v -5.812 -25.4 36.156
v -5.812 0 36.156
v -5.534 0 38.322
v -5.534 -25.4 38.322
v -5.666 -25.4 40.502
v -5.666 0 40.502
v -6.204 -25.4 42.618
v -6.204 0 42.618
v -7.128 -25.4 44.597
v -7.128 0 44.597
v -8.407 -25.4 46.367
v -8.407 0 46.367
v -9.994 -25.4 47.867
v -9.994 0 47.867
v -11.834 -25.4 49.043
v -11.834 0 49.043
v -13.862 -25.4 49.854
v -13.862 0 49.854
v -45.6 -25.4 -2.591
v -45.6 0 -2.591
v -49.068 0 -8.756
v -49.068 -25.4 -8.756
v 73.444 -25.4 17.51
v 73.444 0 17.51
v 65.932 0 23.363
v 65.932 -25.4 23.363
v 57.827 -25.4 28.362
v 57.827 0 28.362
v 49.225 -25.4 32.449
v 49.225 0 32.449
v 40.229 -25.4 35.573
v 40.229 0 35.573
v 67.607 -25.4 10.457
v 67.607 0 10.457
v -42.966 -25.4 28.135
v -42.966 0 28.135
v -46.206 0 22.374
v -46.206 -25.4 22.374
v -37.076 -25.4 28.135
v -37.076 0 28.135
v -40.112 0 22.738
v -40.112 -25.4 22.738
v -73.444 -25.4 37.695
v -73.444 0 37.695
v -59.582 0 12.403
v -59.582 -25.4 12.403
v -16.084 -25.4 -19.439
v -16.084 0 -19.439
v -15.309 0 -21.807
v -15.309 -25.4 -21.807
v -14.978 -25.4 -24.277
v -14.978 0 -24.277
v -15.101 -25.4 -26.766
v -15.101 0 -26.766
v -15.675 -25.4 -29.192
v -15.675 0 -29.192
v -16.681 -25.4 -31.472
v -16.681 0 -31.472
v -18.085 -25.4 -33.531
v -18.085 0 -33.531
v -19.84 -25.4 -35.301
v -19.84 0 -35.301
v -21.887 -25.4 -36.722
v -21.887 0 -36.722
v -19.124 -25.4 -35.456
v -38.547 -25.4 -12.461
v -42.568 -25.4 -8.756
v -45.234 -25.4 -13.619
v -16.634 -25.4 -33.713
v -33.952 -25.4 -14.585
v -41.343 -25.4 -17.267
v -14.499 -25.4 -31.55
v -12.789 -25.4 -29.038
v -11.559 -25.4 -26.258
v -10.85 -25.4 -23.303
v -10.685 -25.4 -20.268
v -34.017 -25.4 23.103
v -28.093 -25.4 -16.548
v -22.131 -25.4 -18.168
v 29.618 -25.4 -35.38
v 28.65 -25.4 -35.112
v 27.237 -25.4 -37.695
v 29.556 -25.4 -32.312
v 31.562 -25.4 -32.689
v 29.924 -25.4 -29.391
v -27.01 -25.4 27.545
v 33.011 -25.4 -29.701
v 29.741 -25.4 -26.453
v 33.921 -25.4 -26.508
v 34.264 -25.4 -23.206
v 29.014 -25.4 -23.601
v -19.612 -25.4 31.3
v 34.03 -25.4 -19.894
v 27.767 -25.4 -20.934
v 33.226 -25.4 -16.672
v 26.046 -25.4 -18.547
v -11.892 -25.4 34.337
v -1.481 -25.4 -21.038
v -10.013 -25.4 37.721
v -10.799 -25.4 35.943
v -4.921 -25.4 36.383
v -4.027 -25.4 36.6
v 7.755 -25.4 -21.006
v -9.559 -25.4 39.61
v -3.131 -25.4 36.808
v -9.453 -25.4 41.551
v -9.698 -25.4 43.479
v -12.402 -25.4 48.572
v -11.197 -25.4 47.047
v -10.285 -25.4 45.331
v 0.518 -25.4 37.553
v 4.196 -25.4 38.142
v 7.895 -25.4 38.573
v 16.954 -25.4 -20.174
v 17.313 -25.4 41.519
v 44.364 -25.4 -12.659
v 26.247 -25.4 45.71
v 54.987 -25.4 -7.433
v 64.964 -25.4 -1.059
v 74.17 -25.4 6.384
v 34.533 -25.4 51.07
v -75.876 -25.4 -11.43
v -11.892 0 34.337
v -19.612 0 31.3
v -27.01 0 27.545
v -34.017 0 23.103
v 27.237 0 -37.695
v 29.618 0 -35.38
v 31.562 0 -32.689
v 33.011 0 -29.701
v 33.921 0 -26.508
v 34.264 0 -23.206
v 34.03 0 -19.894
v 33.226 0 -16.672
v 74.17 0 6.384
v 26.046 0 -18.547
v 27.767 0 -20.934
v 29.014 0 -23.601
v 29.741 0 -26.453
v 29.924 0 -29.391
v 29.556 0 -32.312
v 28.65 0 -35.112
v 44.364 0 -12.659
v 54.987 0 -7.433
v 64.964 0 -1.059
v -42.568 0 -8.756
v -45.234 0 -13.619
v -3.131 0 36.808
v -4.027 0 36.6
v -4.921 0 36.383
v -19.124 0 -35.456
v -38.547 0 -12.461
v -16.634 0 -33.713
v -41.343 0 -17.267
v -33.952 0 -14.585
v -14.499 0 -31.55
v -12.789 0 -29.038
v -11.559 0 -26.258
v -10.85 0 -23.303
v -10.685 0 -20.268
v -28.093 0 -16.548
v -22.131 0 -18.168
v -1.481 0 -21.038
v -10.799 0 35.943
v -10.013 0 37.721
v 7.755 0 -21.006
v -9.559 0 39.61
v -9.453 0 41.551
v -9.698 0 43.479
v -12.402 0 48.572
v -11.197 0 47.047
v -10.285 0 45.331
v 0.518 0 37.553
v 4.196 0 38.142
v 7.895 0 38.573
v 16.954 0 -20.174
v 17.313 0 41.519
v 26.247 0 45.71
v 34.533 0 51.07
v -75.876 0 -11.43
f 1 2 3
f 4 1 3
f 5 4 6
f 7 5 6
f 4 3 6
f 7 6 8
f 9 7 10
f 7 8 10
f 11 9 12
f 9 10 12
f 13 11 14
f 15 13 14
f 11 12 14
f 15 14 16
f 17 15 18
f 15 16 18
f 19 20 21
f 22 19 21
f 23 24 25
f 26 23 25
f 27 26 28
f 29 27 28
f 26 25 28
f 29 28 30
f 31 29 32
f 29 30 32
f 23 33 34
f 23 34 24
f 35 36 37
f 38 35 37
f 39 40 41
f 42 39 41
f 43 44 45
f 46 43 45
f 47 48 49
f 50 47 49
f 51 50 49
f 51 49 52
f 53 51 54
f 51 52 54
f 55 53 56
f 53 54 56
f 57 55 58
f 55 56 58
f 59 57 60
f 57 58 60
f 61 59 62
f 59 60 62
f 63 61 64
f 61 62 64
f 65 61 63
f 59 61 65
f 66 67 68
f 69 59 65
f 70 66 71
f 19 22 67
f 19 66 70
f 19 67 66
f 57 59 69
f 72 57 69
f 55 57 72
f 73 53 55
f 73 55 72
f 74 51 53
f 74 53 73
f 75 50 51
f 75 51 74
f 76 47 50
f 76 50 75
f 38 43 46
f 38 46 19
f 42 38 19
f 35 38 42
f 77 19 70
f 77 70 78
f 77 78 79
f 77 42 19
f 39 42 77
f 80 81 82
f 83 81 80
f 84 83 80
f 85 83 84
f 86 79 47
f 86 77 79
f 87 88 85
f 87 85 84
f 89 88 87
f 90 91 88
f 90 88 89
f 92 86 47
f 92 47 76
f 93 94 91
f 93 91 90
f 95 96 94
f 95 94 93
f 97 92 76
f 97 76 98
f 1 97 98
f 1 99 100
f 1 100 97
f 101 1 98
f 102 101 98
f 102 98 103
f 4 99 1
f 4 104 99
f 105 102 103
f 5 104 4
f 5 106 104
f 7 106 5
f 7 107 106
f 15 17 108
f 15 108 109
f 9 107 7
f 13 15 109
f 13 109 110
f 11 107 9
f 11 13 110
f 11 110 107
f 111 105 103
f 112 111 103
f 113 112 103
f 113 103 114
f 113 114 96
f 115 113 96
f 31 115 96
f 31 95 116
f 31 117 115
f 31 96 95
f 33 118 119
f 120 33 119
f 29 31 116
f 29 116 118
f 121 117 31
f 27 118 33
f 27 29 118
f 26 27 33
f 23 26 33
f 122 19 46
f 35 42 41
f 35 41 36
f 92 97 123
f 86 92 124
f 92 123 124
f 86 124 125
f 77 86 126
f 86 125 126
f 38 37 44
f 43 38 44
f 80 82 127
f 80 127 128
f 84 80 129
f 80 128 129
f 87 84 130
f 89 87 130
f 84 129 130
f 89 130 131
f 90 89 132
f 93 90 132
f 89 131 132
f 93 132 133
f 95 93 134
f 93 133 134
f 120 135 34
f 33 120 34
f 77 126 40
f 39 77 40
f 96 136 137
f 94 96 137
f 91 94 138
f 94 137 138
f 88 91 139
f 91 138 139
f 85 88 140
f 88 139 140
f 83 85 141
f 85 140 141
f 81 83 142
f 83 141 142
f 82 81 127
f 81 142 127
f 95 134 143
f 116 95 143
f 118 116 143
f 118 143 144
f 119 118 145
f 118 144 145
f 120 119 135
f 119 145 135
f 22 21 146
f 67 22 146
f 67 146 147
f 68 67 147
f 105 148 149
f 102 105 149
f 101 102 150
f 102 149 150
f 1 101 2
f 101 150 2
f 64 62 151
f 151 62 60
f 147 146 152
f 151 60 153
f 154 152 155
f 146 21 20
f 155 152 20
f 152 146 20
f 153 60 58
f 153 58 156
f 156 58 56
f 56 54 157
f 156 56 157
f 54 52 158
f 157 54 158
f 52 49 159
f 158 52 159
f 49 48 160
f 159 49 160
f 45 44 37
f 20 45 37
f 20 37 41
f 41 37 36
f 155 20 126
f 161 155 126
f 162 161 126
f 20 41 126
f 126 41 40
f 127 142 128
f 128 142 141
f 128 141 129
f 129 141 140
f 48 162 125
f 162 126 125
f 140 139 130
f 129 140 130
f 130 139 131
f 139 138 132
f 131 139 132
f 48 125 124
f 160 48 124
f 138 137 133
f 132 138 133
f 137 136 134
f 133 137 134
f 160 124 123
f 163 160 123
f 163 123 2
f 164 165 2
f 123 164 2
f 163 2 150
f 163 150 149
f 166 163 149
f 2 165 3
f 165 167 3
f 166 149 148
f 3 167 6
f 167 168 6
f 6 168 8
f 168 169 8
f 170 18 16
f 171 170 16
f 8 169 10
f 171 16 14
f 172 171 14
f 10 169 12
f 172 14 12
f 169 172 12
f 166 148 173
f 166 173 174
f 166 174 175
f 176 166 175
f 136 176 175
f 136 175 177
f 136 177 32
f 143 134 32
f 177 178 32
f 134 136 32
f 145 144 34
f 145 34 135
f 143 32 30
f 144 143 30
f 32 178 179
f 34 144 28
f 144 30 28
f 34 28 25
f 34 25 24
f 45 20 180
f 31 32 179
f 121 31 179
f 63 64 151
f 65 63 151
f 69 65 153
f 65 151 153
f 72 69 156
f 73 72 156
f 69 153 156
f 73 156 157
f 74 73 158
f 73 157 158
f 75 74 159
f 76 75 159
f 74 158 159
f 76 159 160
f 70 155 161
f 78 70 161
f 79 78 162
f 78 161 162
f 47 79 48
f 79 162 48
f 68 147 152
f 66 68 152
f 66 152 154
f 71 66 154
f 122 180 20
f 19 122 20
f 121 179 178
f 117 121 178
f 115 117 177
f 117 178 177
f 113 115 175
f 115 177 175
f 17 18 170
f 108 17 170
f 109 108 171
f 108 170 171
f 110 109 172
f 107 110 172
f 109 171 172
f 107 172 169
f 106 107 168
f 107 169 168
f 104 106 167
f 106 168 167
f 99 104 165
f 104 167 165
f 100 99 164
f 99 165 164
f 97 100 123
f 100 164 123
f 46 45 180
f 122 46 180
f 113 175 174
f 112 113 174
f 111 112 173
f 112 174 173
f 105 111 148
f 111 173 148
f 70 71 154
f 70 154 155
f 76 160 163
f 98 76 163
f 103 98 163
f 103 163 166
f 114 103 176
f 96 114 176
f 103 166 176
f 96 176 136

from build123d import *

# Parameters (mm, degrees)
F0_R     = 2.7728075116
F1_DEPTH = 25.4


with BuildPart() as f1:
    # F0 (on Front) → F1 (new body)
    with BuildSketch(Plane.XZ):
        with BuildLine():
            Line((-46.2063811719, 22.3736166954), (-73.4438300133, 37.6946814358))
            Line((-73.4438300133, 37.6946814358), (-59.5819167793, 12.4027663842))
            Line((-59.5819167793, 12.4027663842), (-75.8757442236, -11.4300008863))
            Line((-75.8757442236, -11.4300008863), (-45.6002619536, -2.5907051222))
            ThreePointArc((-45.6002619536, -2.5907051222), (-44.4025685397, -5.830070686), (-42.5679523522, -8.7561845276))
            ThreePointArc((-42.5679523522, -8.7561845276), (-40.7090131833, -10.7730955419), (-38.5467331667, -12.4607359072))
            ThreePointArc((-38.5467331667, -12.4607359072), (-37.5331692858, -13.0762341628), (-36.4787243307, -13.6187244207))
            ThreePointArc((-36.4787243307, -13.6187244207), (-35.218191008, -14.1097204461), (-33.9515178698, -14.5846525628))
            ThreePointArc((-33.9515178698, -14.5846525628), (-25.1236949217, -17.4009018565), (-16.0843420418, -19.4385027989))
            ThreePointArc((-16.0843420418, -19.4385027989), (-13.3899281297, -19.8880494602), (-10.6848629515, -20.2682874284))
            ThreePointArc((-10.6848629515, -20.2682874284), (7.7554033628, -21.0061419822), (26.0458368353, -18.5468952528))
            ThreePointArc((26.0458368353, -18.5468952528), (29.6524190677, -17.6722711402), (33.2263105994, -16.6724201227))
            ThreePointArc((33.2263105994, -16.6724201227), (54.9868951593, -7.4326700378), (74.1704591011, 6.3835123767))
            Line((74.1704591011, 6.3835123767), (67.6072314382, 10.4572335258))
            Line((67.6072314382, 10.4572335258), (73.4438300133, 17.5097864121))
            ThreePointArc((73.4438300133, 17.5097864121), (57.8267715443, 28.3623597624), (40.2292326492, 35.5732881621))
            ThreePointArc((40.2292326492, 35.5732881621), (24.2028822223, 38.5907293118), (7.8949533391, 38.5729912726))
            ThreePointArc((7.8949533391, 38.5729912726), (2.4157752889, 37.4790688574), (-3.1311035908, 36.8081045884))
            ThreePointArc((-3.1311035908, 36.8081045884), (-4.4740862067, 36.4927174845), (-5.8119143408, 36.1561358224))
            ThreePointArc((-5.8119143408, 36.1561358224), (-8.868524213, 35.3017374622), (-11.8920366653, 34.3367333588))
            ThreePointArc((-11.8920366653, 34.3367333588), (-23.3557486049, 29.5105094754), (-34.0166780636, 23.1031924486))
            Line((-34.0166780636, 23.1031924486), (-40.1115296178, 22.738404572))
            Line((-40.1115296178, 22.738404572), (-46.2063811719, 22.3736166954))
        make_face()
        with Locations((53.9885126054, 20.9144670516)):
            Circle(F0_R, mode=Mode.SUBTRACT)
        with BuildLine():
            ThreePointArc((34.5331951976, 51.0702133179), (21.8513167895, 43.4632987988), (7.8949533391, 38.5729912726))
            ThreePointArc((7.8949533391, 38.5729912726), (24.2028822223, 38.5907293118), (40.2292326492, 35.5732881621))
            Line((40.2292326492, 35.5732881621), (34.5331951976, 51.0702133179))
        make_face()
        with BuildLine():
            ThreePointArc((33.2263105994, -16.6724201227), (29.6524190677, -17.6722711402), (26.0458368353, -18.5468952528))
            ThreePointArc((26.0458368353, -18.5468952528), (29.9013197265, -27.9179314628), (27.237445116, -37.6946814358))
            ThreePointArc((27.237445116, -37.6946814358), (33.5352416657, -28.1246199246), (33.2263105994, -16.6724201227))
        make_face()
        with BuildLine():
            ThreePointArc((-10.6848629515, -20.2682874284), (-13.3899281297, -19.8880494602), (-16.0843420418, -19.4385027989))
            ThreePointArc((-16.0843420418, -19.4385027989), (-15.675284706, -29.1917075818), (-21.8872334808, -36.7219150066))
            ThreePointArc((-21.8872334808, -36.7219150066), (-13.5872618812, -30.3325564753), (-10.6848629515, -20.2682874284))
        make_face()
        with BuildLine():
            ThreePointArc((-13.8619150966, 49.8542524874), (-9.5317359626, 42.5201559061), (-11.8920366653, 34.3367333588))
            ThreePointArc((-11.8920366653, 34.3367333588), (-8.868524213, 35.3017374622), (-5.8119143408, 36.1561358224))
            ThreePointArc((-5.8119143408, 36.1561358224), (-7.128420184, 44.5969007804), (-13.8619150966, 49.8542524874))
        make_face()
        with Locations((53.9885126054, 20.9144670516)):
            Circle(F0_R)
        with BuildLine():
            ThreePointArc((-42.5679523522, -8.7561845276), (-44.4025685397, -5.830070686), (-45.6002619536, -2.5907051222))
            Line((-45.6002619536, -2.5907051222), (-49.0683440665, -8.7561845276))
            Line((-49.0683440665, -8.7561845276), (-42.5679523522, -8.7561845276))
        make_face()
        Polygon((-42.965512128, 28.13516175), (-46.2063811719, 22.3736166954), (-40.1115296178, 22.738404572), align=None)
        Polygon((-37.0758537513, 28.13516175), (-40.1115296178, 22.738404572), (-34.0166780636, 23.1031924486), align=None)
        with BuildLine():
            ThreePointArc((-38.5467331667, -12.4607359072), (-40.7090131833, -10.7730955419), (-42.5679523522, -8.7561845276))
            Line((-42.5679523522, -8.7561845276), (-45.233618468, -13.6187234893))
            Line((-45.233618468, -13.6187234893), (-38.5467331667, -12.4607359072))
        make_face()
        with BuildLine():
            ThreePointArc((-36.4787243307, -13.6187244207), (-37.5331692858, -13.0762341628), (-38.5467331667, -12.4607359072))
            Line((-38.5467331667, -12.4607359072), (-41.3425527513, -17.2665957361))
            Line((-41.3425527513, -17.2665957361), (-33.9515178698, -14.5846525628))
            ThreePointArc((-33.9515178698, -14.5846525628), (-35.218191008, -14.1097204461), (-36.4787243307, -13.6187244207))
        make_face()
        with BuildLine():
            ThreePointArc((7.8949533391, 38.5729912726), (2.3536609221, 37.8671258081), (-3.1311035908, 36.8081045884))
            ThreePointArc((-3.1311035908, 36.8081045884), (2.4157752889, 37.4790688574), (7.8949533391, 38.5729912726))
        make_face()
    extrude(amount=F1_DEPTH)


solid = f1.part
